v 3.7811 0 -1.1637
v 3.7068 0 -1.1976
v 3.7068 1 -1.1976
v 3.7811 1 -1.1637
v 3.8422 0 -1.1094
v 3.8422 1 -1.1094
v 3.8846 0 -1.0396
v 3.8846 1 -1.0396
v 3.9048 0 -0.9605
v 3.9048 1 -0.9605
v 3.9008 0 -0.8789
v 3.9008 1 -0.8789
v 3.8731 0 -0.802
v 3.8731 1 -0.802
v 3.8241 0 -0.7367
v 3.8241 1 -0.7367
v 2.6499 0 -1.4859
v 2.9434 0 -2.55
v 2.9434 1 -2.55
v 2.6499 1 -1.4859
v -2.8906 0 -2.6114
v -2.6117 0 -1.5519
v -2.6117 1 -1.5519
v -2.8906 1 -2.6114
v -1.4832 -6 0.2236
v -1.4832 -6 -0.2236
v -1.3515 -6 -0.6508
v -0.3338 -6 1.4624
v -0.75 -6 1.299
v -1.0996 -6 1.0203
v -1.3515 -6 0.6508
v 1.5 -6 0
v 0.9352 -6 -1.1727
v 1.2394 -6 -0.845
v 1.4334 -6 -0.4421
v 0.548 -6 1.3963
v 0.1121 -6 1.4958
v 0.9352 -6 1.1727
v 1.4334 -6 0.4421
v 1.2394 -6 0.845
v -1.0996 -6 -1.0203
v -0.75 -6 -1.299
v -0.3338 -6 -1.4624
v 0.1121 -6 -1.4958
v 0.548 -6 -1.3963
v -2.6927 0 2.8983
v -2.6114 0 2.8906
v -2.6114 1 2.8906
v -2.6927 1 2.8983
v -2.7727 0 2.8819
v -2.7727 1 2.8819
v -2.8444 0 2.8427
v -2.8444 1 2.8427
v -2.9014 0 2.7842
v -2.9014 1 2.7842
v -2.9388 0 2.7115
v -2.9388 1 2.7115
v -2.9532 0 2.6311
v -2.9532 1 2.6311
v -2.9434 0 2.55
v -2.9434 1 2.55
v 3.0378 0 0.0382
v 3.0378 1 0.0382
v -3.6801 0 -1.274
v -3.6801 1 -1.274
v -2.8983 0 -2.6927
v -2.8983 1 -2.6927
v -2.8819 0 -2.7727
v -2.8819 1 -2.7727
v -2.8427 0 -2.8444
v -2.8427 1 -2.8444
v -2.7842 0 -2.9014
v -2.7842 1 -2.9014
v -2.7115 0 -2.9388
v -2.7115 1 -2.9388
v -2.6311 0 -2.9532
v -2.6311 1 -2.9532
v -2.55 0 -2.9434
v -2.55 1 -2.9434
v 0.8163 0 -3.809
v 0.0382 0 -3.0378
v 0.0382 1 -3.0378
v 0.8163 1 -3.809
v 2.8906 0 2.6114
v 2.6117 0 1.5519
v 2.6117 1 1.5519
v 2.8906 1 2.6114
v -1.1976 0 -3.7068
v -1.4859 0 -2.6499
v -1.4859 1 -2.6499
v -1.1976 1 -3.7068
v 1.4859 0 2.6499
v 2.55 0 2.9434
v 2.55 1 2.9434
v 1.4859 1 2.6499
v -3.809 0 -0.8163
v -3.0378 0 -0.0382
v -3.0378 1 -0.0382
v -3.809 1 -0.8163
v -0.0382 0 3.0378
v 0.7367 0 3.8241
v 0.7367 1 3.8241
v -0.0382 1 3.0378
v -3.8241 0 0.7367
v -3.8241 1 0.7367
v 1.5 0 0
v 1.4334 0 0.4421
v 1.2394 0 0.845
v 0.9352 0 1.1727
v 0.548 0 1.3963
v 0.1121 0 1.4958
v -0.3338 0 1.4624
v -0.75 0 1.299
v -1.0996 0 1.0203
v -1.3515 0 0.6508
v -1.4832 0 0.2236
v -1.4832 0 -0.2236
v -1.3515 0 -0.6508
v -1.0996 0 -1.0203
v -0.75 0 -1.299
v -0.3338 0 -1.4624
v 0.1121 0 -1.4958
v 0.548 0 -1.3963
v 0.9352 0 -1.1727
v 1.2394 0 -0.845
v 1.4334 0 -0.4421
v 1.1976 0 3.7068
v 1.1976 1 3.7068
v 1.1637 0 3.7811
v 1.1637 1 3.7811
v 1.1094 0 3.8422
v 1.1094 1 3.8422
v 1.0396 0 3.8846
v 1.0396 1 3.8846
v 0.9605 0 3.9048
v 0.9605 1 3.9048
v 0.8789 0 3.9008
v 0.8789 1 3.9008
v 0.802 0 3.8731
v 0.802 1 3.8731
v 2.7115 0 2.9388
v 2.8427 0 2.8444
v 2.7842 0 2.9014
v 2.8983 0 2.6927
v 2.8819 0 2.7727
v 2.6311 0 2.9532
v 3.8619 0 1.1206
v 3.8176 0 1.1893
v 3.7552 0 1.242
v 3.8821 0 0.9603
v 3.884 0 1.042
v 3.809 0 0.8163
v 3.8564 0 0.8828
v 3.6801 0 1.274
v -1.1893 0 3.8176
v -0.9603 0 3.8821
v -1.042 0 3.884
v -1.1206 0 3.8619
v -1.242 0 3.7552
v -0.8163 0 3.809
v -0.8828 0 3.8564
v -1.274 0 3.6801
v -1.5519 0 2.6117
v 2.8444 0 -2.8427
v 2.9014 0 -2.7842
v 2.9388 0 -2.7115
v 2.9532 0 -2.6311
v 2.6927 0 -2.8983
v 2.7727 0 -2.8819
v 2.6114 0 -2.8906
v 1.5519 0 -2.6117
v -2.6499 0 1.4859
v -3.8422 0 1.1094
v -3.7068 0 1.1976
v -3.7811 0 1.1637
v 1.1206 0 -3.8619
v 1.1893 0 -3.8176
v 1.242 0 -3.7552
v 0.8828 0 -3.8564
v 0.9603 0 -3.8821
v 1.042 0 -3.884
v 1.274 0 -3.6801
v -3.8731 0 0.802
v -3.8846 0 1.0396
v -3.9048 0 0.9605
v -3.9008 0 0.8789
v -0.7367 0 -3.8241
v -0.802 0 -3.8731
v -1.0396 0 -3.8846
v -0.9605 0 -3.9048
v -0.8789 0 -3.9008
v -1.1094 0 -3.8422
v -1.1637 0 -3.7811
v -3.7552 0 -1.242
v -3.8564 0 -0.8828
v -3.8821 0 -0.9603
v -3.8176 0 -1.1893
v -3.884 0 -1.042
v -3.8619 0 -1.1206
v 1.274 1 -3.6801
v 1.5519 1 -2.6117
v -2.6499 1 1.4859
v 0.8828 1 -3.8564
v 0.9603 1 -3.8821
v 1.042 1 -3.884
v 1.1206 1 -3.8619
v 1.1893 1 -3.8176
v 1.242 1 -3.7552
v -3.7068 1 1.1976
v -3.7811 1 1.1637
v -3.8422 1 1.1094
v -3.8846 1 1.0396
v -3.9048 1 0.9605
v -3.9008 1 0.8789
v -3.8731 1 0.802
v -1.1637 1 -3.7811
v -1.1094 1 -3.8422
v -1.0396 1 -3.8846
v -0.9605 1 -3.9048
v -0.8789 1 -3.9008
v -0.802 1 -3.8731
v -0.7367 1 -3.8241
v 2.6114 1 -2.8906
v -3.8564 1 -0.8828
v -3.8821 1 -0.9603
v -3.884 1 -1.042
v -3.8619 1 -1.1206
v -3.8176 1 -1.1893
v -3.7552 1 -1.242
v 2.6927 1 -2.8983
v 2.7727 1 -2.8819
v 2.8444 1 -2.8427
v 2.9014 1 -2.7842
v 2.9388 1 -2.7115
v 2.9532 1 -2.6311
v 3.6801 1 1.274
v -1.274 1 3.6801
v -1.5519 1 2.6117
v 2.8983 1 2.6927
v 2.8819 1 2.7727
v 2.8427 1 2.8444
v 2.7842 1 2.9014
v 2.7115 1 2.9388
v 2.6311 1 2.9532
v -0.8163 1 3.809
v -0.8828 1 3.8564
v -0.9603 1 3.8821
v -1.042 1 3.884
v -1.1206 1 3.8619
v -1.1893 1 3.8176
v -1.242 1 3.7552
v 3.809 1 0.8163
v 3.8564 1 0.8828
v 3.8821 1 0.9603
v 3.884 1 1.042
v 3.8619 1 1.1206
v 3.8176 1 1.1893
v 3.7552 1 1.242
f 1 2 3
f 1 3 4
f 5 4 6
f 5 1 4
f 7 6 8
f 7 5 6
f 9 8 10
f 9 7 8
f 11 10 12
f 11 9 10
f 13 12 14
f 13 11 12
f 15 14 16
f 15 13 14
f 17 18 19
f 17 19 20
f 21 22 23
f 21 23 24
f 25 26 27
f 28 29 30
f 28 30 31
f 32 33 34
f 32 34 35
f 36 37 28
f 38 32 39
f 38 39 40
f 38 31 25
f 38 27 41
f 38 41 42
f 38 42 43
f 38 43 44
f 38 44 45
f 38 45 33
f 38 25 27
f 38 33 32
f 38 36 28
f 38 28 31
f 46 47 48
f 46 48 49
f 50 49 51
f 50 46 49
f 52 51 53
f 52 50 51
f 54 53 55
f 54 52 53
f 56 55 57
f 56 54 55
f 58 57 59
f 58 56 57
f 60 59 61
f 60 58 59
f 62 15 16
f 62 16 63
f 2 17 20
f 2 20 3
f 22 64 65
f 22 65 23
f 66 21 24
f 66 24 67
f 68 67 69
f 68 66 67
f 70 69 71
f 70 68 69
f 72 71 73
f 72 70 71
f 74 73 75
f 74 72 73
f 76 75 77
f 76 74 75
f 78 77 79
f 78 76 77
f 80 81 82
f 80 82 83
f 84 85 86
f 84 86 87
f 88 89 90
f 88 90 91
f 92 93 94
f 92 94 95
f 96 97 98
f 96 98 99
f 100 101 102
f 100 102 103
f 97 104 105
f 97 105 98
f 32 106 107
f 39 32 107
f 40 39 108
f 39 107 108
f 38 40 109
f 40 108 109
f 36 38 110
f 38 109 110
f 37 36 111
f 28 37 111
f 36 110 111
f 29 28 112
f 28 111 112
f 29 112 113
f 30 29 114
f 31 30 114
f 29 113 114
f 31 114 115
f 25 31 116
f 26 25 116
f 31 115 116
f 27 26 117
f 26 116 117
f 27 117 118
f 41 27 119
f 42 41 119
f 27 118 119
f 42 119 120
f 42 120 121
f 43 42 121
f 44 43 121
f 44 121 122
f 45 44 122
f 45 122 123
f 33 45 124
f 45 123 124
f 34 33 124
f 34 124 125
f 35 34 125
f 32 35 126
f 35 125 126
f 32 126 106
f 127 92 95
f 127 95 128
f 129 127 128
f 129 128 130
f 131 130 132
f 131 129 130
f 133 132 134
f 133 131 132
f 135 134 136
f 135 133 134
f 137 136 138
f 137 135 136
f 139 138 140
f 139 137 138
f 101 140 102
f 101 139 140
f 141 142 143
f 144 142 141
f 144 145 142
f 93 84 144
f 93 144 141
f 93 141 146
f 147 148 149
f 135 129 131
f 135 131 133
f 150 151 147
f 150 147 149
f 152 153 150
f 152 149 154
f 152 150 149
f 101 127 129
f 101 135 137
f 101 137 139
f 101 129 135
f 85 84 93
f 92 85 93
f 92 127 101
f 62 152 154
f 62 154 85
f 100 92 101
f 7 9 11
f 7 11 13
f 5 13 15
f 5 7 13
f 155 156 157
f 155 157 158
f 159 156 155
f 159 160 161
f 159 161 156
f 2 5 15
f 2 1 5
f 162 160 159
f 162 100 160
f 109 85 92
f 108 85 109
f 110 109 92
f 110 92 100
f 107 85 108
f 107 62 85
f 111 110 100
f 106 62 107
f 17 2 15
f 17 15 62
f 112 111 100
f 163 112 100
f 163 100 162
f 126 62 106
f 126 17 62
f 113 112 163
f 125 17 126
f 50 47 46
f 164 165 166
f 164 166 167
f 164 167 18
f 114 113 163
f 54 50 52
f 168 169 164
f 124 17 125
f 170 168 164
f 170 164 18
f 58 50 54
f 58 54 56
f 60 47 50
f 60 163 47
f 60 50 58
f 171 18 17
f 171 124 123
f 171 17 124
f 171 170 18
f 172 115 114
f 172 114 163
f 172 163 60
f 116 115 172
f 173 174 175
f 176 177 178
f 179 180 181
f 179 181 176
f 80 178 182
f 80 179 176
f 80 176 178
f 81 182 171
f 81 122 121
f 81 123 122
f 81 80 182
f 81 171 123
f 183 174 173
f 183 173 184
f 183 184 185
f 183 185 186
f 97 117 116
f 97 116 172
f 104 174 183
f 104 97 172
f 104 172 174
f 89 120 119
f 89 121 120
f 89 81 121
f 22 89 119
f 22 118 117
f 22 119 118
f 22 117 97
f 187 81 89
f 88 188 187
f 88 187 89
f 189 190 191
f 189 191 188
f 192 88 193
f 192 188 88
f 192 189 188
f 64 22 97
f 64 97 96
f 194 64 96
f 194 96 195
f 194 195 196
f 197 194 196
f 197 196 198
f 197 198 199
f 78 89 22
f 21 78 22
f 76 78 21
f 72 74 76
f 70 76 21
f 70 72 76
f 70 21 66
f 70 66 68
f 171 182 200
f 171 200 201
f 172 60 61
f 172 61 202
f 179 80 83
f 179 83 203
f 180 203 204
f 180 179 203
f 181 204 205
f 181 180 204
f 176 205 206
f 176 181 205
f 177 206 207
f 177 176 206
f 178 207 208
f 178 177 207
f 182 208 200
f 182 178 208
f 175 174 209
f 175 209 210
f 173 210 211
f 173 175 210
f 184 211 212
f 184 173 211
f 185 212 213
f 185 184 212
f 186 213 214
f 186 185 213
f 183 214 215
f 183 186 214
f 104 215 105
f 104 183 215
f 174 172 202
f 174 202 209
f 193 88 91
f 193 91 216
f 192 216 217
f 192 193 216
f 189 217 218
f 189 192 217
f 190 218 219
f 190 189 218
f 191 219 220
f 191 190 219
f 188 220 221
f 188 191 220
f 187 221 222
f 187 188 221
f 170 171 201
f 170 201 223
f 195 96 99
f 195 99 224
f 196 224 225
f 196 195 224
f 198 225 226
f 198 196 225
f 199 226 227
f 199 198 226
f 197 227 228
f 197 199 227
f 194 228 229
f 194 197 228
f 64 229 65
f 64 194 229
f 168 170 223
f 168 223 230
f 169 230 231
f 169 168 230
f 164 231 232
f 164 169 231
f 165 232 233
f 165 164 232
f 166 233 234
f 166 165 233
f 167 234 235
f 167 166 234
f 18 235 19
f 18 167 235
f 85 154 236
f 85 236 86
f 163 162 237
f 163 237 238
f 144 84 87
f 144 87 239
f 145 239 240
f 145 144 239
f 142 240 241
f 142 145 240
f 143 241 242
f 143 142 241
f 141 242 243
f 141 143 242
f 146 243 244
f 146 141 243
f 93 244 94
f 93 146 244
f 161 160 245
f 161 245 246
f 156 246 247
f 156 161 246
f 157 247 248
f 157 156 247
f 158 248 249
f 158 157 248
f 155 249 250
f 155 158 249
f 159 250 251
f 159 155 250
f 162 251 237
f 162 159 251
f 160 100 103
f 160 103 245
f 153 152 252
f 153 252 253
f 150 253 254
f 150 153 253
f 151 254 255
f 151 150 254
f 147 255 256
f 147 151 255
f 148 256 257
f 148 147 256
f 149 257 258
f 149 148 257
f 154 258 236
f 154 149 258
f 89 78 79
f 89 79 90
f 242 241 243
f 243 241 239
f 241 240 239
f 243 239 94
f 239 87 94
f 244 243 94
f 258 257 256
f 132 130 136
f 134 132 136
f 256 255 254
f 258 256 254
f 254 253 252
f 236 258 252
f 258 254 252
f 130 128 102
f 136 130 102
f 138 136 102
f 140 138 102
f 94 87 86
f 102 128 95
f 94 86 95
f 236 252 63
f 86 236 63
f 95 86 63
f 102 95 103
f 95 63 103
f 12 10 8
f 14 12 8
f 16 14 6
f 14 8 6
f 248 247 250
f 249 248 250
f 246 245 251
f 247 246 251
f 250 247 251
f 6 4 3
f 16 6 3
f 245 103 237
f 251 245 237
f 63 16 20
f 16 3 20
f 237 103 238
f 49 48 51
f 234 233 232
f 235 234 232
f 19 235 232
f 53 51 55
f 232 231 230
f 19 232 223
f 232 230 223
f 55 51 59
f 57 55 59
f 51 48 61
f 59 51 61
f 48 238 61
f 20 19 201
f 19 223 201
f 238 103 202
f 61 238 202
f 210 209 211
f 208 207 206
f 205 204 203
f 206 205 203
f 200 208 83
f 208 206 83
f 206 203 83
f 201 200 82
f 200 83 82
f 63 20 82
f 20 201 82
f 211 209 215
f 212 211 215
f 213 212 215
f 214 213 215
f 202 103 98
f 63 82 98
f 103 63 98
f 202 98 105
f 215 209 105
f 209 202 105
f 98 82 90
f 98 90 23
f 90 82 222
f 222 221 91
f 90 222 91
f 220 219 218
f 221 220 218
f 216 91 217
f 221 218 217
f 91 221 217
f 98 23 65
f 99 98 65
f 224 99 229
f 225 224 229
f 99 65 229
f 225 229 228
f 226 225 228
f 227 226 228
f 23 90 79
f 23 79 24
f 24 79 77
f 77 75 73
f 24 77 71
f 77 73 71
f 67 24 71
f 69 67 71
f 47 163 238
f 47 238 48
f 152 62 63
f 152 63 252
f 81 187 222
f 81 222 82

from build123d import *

# Parameters (mm, degrees)
BOSS_EXTRUDE1_DEPTH = 1
SKETCH2_R           = 1.5
BOSS_EXTRUDE2_DEPTH = 6


with BuildPart() as part:
    # Sketch1 → Boss-Extrude1 (new body)
    with BuildSketch(Plane(origin=(0, 0, 0), x_dir=(1, 0, 0), z_dir=(0, 1, 0))):
        with BuildLine():
            Line((0.038153439, 3.037815087), (0.816252158, 3.809013473))
            ThreePointArc((0.816252158, 3.809013473), (1.082123997, 3.875868882), (1.274025664, 3.680085251))
            Line((1.274025664, 3.680085251), (1.551949391, 2.611748318))
            Line((1.551949391, 2.611748318), (2.611401842, 2.890576352))
            ThreePointArc((2.611401842, 2.890576352), (2.875081312, 2.815538915), (2.943381216, 2.550034483))
            Line((2.943381216, 2.550034483), (2.649901757, 1.485865696))
            Line((2.649901757, 1.485865696), (3.70682851, 1.197611631))
            ThreePointArc((3.70682851, 1.197611631), (3.897662912, 1.00078757), (3.824060148, 0.736704035))
            Line((3.824060148, 0.736704035), (3.037815087, -0.038153439))
            Line((3.037815087, -0.038153439), (3.809013473, -0.816252158))
            ThreePointArc((3.809013473, -0.816252158), (3.875868882, -1.082123997), (3.680085251, -1.274025664))
            Line((3.680085251, -1.274025664), (2.611748318, -1.551949391))
            Line((2.611748318, -1.551949391), (2.890576352, -2.611401842))
            ThreePointArc((2.890576352, -2.611401842), (2.815538915, -2.875081312), (2.550034483, -2.943381216))
            Line((2.550034483, -2.943381216), (1.485865696, -2.649901757))
            Line((1.485865696, -2.649901757), (1.197611631, -3.70682851))
            ThreePointArc((1.197611631, -3.70682851), (1.00078757, -3.897662912), (0.736704035, -3.824060148))
            Line((0.736704035, -3.824060148), (-0.038153439, -3.037815087))
            Line((-0.038153439, -3.037815087), (-0.816252158, -3.809013473))
            ThreePointArc((-0.816252158, -3.809013473), (-1.082123997, -3.875868882), (-1.274025664, -3.680085251))
            Line((-1.274025664, -3.680085251), (-1.551949391, -2.611748318))
            Line((-1.551949391, -2.611748318), (-2.611401842, -2.890576352))
            ThreePointArc((-2.611401842, -2.890576352), (-2.875081312, -2.815538915), (-2.943381216, -2.550034483))
            Line((-2.943381216, -2.550034483), (-2.649901757, -1.485865696))
            Line((-2.649901757, -1.485865696), (-3.70682851, -1.197611631))
            ThreePointArc((-3.70682851, -1.197611631), (-3.897662912, -1.00078757), (-3.824060148, -0.736704035))
            Line((-3.824060148, -0.736704035), (-3.037815087, 0.038153439))
            Line((-3.037815087, 0.038153439), (-3.809013473, 0.816252158))
            ThreePointArc((-3.809013473, 0.816252158), (-3.875868882, 1.082123997), (-3.680085251, 1.274025664))
            Line((-3.680085251, 1.274025664), (-2.611748318, 1.551949391))
            Line((-2.611748318, 1.551949391), (-2.890576352, 2.611401842))
            ThreePointArc((-2.890576352, 2.611401842), (-2.815538915, 2.875081312), (-2.550034483, 2.943381216))
            Line((-2.550034483, 2.943381216), (-1.485865696, 2.649901757))
            Line((-1.485865696, 2.649901757), (-1.197611631, 3.70682851))
            ThreePointArc((-1.197611631, 3.70682851), (-1.00078757, 3.897662912), (-0.736704035, 3.824060148))
            Line((-0.736704035, 3.824060148), (0.038153439, 3.037815087))
        make_face()
    extrude(amount=BOSS_EXTRUDE1_DEPTH)

    # Sketch2 → Boss-Extrude2 (add)
    with BuildSketch(Plane.XZ):
        Circle(SKETCH2_R)
    extrude(amount=BOSS_EXTRUDE2_DEPTH)


solid = part.part
